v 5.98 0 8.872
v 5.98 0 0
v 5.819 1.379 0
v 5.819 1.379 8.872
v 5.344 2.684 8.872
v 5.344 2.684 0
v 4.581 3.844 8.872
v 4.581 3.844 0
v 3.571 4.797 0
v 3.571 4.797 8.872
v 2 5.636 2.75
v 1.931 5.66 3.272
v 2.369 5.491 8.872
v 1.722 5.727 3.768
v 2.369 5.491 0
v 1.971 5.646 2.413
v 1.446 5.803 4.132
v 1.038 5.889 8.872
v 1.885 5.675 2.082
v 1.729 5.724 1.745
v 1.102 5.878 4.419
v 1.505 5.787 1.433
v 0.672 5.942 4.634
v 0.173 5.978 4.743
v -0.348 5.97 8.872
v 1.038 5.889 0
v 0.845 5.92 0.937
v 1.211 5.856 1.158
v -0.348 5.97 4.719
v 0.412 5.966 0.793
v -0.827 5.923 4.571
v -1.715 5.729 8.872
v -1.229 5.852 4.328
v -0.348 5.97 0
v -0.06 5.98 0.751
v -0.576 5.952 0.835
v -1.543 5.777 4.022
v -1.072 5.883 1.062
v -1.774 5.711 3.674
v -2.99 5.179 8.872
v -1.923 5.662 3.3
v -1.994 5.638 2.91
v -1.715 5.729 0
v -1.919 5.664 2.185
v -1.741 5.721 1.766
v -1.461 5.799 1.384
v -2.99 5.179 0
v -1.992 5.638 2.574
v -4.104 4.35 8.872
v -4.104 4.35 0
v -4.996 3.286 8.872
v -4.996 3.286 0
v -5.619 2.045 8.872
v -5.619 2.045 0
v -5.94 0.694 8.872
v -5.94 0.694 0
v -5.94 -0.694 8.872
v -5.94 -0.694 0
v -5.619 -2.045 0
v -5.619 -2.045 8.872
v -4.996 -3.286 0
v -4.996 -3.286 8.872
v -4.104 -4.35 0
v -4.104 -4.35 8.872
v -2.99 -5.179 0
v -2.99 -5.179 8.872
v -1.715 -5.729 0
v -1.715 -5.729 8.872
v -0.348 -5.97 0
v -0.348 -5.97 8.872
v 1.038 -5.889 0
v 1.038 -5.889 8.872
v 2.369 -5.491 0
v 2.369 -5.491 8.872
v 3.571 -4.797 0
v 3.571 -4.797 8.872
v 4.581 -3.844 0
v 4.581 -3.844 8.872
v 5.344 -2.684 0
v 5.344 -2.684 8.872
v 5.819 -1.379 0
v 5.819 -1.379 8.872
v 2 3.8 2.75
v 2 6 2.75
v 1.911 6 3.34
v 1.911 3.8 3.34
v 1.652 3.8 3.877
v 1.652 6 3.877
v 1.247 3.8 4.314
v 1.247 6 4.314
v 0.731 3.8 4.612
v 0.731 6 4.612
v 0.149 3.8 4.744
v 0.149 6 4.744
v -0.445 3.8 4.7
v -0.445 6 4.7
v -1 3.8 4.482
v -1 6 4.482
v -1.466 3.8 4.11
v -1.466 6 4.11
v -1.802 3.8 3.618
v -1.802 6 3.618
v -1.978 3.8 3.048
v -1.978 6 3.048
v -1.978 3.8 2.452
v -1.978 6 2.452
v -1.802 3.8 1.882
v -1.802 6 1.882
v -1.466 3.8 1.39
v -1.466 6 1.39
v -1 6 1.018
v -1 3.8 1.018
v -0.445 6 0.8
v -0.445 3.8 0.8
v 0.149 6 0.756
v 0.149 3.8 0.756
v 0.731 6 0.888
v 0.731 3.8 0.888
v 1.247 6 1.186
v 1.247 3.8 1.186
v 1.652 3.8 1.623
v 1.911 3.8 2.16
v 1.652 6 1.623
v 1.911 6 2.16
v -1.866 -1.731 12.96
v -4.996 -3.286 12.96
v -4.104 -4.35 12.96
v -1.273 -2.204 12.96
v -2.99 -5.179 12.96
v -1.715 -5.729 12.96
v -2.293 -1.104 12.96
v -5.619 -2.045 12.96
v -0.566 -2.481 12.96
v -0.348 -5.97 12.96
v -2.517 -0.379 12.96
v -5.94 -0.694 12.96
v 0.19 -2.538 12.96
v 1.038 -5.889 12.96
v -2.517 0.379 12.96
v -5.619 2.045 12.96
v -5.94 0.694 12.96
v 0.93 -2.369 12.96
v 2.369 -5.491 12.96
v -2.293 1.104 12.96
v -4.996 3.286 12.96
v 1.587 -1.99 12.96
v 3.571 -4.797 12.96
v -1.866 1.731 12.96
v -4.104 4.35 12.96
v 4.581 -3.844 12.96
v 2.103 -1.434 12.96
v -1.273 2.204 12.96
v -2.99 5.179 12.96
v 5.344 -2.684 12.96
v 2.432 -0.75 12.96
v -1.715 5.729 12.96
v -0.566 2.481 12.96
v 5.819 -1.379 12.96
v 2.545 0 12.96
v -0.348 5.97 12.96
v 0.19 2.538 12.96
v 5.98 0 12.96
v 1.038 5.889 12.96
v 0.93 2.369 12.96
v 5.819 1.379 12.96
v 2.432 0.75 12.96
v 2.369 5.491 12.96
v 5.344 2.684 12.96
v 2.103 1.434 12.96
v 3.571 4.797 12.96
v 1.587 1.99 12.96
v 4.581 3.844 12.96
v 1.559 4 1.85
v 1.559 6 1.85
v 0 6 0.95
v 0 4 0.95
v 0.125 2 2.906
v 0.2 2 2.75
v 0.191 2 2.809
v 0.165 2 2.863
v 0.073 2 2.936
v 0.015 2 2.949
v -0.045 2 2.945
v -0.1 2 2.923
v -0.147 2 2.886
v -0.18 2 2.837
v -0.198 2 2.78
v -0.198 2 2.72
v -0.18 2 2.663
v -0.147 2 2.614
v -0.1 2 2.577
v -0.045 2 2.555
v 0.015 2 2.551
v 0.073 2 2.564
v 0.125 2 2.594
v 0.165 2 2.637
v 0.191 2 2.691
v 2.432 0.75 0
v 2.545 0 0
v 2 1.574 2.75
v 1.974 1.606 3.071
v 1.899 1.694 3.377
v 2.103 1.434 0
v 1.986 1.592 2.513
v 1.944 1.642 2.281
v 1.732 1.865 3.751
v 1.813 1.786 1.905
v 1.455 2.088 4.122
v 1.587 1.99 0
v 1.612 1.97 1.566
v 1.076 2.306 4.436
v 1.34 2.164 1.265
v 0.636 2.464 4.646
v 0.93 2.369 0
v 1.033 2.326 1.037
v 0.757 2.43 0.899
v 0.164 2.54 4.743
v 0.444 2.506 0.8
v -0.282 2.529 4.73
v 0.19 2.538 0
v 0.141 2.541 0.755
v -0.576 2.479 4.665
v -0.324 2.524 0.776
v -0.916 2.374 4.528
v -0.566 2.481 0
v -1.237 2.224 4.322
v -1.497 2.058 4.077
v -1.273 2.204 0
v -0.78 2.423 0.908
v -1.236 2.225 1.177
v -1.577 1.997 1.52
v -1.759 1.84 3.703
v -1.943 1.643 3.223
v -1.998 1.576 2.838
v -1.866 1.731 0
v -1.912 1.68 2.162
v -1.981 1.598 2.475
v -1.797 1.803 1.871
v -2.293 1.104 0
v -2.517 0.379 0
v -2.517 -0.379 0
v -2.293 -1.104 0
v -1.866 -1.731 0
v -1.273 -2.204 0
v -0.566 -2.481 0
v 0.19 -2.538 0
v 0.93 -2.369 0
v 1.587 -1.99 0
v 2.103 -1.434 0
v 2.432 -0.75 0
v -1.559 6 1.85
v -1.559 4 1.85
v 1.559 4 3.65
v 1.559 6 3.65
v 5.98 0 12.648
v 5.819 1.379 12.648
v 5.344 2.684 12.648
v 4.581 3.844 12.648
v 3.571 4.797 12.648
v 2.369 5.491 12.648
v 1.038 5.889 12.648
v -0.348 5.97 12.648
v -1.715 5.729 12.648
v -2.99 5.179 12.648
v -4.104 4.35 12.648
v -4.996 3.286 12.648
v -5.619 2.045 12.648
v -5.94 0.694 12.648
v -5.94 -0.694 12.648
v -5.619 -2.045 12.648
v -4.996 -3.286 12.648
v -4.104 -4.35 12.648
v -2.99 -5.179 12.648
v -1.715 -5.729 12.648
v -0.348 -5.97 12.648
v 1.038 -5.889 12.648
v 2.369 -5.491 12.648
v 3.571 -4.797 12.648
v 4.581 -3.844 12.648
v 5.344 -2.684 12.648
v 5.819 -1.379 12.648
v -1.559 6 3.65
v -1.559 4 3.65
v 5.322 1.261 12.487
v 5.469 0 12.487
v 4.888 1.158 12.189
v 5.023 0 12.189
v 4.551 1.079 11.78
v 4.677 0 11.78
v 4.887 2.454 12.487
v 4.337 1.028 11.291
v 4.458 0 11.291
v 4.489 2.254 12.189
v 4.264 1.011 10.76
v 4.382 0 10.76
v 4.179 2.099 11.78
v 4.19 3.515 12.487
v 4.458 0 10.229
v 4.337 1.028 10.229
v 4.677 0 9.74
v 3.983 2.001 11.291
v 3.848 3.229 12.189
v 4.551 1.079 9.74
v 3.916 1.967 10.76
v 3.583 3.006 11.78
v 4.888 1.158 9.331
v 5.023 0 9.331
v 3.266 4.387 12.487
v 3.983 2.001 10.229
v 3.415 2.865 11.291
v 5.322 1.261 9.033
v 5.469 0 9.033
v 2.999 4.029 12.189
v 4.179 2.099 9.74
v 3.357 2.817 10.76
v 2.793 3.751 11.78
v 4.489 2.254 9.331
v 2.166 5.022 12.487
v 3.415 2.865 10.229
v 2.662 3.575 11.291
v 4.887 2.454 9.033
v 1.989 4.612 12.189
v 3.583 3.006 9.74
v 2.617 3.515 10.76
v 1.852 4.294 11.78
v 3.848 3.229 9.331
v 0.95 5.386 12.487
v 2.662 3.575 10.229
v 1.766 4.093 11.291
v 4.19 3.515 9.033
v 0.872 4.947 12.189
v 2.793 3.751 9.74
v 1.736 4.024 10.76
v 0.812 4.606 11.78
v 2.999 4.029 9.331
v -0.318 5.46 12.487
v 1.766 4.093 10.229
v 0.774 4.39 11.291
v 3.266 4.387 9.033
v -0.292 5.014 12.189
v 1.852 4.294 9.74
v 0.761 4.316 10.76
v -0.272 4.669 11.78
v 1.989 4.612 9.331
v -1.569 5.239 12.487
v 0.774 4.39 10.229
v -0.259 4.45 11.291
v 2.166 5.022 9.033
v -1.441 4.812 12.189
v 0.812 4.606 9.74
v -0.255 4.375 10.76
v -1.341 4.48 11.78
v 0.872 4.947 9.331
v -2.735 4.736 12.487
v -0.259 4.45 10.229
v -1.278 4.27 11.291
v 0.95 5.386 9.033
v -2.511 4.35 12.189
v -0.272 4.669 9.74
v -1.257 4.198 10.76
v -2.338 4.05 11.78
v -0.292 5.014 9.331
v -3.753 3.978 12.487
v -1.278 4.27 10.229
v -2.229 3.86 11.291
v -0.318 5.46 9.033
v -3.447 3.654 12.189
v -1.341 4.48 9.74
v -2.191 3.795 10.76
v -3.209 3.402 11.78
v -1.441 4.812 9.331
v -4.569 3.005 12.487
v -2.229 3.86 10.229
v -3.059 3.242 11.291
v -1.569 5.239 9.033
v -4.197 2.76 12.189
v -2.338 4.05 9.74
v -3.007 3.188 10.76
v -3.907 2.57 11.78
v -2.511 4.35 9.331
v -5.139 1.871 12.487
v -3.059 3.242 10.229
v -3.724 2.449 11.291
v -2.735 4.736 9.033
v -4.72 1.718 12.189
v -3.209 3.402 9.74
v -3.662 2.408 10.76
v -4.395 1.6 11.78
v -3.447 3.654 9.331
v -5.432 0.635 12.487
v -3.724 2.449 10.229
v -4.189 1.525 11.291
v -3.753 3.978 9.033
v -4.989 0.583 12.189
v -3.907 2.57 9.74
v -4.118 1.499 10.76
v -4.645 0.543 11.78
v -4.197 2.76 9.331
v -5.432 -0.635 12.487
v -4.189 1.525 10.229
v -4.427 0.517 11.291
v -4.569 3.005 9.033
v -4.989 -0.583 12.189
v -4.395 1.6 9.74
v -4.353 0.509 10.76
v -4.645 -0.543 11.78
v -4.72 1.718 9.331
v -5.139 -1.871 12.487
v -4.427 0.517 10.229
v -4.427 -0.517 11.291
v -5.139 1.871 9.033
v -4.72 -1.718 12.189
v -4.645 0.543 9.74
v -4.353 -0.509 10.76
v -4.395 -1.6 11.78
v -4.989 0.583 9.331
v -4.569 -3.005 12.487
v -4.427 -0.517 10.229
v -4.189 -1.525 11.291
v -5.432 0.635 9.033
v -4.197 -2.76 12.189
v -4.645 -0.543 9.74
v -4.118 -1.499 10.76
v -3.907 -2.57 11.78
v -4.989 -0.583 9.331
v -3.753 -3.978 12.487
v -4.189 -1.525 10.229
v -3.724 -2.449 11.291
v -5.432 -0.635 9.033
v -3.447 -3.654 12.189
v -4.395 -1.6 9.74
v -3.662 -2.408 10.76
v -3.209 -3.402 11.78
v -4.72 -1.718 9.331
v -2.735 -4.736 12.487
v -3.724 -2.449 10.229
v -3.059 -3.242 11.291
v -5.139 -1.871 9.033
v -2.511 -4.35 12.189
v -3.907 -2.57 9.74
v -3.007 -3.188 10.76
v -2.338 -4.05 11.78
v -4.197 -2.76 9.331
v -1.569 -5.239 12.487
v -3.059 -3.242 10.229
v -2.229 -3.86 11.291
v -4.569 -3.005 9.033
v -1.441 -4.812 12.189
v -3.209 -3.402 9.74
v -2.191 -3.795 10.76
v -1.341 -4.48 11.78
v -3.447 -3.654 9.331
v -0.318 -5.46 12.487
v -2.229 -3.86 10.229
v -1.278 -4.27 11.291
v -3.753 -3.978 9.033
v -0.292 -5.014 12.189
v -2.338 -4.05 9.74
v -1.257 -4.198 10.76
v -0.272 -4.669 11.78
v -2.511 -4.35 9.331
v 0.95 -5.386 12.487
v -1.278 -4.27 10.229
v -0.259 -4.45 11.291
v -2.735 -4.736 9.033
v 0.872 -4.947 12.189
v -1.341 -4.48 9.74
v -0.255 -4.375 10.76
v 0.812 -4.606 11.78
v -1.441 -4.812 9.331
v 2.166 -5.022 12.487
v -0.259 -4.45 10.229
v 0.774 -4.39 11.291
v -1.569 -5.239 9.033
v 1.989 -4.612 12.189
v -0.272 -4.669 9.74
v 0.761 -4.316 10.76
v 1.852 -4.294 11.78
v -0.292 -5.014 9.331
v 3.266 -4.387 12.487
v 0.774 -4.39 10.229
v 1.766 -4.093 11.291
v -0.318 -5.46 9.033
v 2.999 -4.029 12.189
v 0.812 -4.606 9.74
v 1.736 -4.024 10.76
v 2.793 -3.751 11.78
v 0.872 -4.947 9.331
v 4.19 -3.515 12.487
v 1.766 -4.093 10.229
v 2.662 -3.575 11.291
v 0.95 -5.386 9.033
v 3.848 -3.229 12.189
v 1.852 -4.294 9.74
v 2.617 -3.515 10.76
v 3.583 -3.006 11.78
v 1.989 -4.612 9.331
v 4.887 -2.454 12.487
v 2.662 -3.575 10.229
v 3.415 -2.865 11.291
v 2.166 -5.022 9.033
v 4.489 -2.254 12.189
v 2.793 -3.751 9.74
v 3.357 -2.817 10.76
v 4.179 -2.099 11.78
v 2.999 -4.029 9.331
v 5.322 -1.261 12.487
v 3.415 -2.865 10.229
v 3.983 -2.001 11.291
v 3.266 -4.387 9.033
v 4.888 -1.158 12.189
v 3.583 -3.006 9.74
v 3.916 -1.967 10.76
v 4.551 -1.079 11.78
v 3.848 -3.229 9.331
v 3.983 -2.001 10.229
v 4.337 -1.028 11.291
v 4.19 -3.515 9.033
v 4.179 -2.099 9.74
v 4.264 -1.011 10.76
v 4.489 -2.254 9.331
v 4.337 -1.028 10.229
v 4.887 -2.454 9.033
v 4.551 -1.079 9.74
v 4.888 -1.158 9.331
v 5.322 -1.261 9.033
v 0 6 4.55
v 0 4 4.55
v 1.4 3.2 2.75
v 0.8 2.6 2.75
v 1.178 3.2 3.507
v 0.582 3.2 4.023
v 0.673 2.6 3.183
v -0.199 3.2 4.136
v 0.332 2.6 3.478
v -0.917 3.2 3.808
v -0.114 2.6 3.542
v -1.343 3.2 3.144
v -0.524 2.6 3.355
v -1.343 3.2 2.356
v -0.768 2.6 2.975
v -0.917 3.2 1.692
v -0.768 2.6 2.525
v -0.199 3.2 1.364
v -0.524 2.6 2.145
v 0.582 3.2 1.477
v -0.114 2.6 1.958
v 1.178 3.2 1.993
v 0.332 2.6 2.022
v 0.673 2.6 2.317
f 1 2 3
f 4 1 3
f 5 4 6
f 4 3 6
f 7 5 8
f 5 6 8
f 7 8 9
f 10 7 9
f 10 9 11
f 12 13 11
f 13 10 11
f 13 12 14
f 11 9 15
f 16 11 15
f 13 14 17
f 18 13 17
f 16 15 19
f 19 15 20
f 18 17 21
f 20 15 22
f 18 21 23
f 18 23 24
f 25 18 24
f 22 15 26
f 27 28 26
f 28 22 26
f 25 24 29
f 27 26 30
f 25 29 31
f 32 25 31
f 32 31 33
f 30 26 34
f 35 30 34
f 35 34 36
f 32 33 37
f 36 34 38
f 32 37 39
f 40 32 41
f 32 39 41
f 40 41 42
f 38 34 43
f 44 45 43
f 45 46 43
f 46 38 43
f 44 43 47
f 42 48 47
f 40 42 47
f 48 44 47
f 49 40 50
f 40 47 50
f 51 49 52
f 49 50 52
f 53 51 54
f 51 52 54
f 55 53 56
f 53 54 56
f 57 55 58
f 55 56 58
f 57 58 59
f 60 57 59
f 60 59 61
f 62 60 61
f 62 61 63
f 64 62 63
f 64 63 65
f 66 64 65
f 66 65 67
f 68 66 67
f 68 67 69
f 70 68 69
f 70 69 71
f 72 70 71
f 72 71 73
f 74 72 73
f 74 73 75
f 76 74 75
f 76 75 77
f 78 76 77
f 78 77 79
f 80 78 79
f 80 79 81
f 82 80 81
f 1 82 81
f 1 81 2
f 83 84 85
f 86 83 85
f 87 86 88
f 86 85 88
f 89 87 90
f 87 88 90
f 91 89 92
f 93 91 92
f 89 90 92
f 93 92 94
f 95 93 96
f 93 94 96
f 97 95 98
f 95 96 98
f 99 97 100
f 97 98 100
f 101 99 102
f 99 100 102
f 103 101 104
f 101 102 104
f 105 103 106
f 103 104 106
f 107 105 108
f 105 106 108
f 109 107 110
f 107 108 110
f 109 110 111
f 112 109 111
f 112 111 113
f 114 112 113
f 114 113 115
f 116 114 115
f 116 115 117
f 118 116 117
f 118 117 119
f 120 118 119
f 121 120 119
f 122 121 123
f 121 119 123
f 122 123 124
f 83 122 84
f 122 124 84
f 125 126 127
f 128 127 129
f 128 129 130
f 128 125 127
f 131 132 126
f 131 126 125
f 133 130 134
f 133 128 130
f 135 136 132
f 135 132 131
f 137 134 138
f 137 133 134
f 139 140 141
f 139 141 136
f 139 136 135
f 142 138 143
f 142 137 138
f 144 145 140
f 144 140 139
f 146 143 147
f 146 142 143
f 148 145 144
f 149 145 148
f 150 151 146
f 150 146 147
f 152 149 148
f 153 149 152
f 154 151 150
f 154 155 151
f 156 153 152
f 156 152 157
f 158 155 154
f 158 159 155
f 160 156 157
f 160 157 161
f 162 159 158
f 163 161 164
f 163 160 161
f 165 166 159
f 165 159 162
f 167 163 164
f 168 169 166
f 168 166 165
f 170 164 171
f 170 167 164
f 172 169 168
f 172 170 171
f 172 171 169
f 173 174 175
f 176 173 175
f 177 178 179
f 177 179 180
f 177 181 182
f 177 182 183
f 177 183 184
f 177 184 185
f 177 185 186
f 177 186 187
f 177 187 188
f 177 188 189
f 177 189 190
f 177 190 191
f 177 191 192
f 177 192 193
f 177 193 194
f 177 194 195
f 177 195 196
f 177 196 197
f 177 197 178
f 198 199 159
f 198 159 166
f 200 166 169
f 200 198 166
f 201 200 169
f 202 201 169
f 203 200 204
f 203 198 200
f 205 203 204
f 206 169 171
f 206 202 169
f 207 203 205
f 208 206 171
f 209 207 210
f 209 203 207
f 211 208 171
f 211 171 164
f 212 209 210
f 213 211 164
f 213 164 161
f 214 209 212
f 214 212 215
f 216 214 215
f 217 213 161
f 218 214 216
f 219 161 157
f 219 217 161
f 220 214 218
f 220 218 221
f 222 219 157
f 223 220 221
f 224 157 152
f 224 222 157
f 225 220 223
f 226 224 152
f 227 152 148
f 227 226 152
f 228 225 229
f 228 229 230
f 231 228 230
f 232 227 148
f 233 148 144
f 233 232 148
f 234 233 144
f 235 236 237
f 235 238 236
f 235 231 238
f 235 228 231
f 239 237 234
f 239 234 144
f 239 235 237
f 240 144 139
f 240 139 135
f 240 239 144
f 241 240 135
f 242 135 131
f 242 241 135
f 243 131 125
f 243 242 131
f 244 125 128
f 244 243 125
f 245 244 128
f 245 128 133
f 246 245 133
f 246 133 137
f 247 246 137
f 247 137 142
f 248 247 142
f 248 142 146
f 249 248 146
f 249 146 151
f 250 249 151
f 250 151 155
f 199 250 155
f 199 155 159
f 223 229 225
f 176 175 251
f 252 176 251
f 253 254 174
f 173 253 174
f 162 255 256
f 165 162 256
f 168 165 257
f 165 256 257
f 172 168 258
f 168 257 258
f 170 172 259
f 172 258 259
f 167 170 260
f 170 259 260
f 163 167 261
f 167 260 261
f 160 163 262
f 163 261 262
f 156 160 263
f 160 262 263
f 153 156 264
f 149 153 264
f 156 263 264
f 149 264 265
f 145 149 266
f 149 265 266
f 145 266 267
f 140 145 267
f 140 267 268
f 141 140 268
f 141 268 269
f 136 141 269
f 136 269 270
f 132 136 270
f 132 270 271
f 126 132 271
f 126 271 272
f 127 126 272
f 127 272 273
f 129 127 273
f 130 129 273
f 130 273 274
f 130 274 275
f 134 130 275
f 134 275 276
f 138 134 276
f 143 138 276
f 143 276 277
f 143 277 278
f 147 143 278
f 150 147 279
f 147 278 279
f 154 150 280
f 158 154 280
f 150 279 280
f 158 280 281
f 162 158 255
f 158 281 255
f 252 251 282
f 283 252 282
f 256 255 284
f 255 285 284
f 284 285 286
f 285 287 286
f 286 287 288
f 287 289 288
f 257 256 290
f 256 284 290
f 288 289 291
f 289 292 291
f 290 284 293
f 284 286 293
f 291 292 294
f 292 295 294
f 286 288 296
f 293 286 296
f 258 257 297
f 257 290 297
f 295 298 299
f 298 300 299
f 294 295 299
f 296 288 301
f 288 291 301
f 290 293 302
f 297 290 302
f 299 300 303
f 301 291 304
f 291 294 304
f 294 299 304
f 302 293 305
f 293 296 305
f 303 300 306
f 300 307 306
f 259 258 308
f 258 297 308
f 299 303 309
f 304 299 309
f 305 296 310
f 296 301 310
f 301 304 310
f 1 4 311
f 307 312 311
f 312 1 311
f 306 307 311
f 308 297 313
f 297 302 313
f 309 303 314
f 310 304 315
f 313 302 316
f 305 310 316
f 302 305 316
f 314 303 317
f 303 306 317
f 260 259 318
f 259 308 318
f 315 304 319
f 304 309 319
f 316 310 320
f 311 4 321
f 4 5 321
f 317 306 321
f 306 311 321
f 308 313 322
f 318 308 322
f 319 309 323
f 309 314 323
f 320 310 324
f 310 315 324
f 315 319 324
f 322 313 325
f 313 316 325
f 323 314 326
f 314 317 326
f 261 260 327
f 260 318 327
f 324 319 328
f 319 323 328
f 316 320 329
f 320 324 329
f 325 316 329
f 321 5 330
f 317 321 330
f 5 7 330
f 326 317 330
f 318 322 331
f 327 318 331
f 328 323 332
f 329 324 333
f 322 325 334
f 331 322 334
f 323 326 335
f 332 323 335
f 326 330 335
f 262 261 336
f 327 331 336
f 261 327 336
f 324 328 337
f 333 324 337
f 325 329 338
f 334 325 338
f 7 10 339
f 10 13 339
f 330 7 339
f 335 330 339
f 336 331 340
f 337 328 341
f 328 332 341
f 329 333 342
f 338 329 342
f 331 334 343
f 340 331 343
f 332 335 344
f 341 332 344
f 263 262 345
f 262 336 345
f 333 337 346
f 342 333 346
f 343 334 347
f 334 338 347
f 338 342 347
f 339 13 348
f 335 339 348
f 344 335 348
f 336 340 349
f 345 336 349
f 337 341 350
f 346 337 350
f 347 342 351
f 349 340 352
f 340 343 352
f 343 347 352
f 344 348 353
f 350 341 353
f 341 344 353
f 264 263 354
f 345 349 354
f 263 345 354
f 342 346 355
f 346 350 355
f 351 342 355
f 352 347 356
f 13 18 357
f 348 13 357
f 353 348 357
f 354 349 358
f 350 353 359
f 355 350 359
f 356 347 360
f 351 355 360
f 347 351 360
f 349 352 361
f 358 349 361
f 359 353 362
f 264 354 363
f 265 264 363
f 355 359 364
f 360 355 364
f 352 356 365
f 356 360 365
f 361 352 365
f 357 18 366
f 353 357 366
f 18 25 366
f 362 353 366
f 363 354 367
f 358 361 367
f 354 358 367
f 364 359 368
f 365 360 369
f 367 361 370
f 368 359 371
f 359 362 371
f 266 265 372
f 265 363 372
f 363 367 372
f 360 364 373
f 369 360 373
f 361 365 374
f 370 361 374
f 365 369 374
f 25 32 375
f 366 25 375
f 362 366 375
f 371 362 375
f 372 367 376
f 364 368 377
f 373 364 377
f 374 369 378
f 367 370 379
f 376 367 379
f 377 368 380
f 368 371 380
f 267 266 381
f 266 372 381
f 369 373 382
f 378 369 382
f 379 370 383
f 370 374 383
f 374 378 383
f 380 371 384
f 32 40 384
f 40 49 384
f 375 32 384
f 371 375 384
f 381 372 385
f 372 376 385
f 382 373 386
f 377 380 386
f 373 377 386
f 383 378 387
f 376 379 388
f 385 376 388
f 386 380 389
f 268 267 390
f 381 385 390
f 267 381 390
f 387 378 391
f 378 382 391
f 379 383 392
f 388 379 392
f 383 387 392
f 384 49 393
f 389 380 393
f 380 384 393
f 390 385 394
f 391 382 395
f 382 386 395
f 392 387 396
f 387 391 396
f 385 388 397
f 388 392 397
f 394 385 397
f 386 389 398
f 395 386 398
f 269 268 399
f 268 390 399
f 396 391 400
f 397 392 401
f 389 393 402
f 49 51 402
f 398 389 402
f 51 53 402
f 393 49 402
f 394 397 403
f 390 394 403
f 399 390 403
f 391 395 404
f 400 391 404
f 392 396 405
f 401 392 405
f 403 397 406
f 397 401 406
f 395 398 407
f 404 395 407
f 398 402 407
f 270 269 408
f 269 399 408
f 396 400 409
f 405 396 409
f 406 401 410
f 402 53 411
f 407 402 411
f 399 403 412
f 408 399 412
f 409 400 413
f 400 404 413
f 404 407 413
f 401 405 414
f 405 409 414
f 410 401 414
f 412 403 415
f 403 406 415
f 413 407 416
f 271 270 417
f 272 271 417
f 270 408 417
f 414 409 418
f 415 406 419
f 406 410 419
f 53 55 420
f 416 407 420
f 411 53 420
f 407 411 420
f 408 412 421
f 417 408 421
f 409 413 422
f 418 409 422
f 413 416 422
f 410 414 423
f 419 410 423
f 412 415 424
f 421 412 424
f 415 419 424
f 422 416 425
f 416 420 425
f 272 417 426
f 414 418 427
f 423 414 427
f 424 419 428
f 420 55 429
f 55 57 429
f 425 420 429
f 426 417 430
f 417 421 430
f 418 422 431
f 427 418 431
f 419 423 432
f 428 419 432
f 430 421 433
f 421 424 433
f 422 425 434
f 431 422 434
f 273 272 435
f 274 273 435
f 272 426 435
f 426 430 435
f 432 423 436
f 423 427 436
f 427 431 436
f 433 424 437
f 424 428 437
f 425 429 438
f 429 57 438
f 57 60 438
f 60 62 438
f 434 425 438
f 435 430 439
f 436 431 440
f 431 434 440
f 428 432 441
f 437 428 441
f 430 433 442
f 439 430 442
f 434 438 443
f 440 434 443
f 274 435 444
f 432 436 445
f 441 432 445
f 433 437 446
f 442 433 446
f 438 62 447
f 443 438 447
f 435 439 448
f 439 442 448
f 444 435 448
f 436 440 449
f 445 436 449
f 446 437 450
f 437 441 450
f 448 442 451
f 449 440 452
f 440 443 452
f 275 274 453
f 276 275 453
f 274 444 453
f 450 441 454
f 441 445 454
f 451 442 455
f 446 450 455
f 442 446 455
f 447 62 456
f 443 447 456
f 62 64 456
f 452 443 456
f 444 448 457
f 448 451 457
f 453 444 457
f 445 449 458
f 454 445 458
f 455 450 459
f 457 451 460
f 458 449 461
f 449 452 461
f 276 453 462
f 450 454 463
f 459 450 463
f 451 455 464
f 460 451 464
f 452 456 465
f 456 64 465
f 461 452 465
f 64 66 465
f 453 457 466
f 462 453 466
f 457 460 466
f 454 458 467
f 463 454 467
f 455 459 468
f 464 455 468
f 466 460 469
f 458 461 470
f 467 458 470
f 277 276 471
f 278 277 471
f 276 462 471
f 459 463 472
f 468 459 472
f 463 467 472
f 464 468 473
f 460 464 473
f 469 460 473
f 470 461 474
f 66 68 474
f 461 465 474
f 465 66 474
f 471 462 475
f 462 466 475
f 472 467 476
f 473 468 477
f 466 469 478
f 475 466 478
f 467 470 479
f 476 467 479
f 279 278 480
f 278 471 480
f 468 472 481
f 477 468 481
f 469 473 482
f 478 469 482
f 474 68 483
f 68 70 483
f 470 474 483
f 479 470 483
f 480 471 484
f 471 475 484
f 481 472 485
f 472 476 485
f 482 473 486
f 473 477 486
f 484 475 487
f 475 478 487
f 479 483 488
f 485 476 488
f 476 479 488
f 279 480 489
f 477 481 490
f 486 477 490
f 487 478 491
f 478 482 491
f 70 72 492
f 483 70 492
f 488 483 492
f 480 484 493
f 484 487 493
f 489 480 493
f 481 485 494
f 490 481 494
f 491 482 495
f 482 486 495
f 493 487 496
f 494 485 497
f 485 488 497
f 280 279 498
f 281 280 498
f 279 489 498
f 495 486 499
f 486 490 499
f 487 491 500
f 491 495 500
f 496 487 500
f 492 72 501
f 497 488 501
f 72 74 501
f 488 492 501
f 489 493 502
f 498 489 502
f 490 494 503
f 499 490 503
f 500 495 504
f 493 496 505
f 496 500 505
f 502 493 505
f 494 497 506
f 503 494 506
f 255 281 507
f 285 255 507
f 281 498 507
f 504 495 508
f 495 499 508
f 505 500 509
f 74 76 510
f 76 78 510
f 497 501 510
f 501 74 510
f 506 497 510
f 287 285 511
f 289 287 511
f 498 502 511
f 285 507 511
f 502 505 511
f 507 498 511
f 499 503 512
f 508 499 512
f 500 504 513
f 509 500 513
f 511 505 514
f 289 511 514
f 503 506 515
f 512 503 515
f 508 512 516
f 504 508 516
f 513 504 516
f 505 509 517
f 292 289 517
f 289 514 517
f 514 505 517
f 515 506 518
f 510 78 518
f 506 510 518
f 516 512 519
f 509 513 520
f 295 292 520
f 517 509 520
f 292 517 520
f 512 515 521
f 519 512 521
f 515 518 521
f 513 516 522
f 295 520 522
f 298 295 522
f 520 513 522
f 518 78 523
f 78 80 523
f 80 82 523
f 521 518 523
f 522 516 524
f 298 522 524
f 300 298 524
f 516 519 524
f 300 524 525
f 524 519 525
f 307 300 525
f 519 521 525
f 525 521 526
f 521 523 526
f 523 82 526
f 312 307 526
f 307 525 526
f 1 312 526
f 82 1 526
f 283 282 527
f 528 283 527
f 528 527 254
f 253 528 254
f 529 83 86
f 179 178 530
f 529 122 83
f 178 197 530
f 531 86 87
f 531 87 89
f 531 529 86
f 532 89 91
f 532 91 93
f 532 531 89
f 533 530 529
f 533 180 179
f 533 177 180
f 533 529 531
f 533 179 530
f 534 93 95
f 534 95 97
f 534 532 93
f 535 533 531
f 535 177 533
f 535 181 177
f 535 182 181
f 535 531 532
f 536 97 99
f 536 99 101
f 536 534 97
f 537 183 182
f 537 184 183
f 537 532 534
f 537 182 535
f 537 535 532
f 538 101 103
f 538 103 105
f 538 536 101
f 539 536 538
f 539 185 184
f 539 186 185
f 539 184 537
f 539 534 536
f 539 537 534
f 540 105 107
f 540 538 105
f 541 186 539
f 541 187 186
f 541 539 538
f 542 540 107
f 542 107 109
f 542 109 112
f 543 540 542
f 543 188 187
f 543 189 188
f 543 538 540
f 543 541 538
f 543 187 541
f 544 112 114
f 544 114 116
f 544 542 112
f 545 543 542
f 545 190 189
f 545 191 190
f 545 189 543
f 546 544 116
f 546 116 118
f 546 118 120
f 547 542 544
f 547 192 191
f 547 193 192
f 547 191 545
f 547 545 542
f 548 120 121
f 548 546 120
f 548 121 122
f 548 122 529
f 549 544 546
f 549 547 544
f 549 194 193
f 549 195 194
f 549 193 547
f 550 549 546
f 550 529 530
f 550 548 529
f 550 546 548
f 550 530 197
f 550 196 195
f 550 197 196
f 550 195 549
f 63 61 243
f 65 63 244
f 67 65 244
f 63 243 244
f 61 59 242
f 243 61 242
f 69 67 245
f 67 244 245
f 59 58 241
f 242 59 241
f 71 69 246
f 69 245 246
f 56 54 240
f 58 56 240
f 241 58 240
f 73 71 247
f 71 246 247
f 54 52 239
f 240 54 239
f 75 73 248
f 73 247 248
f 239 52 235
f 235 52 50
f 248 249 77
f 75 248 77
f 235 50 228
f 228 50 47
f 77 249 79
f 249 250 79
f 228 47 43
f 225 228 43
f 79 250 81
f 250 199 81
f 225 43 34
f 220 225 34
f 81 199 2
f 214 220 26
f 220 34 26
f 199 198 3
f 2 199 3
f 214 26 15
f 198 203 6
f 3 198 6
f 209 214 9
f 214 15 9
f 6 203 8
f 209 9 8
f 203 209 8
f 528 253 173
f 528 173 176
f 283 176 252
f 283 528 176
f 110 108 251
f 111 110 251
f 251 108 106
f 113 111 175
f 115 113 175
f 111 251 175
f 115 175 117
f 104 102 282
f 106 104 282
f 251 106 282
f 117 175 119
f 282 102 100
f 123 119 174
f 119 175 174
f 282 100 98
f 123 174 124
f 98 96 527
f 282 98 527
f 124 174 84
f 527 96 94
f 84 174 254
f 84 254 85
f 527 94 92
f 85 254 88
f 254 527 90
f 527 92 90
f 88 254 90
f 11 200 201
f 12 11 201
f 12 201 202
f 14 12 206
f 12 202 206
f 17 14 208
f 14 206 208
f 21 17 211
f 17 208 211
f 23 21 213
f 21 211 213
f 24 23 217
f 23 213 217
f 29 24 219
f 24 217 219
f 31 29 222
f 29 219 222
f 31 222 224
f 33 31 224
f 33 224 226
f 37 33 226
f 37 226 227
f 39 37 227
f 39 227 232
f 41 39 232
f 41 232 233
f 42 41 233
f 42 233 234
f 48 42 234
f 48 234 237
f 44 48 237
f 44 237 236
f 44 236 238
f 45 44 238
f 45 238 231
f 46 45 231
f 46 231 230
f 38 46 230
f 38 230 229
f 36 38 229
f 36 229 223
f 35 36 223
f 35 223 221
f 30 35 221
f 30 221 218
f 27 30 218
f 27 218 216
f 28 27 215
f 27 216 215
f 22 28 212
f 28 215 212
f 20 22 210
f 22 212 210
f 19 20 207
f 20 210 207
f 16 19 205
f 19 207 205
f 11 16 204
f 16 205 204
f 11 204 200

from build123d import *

# Parameters (mm, degrees)
F0_R      = 5.98
F0_R_2    = 2.545
F1_DEPTH  = 12.96
F2_R      = 2
F3_DEPTH  = 5.981
F6_R      = 1.915
F10_R     = 2
F11_DEPTH = 4
F12_SIZE  = 1.8
F14_DEPTH = 2


with BuildPart() as f1:
    # F0 (on Top) → F1 (new body)
    with BuildSketch(Plane.XY):
        Circle(F0_R)
        Circle(F0_R_2, mode=Mode.SUBTRACT)
    extrude(amount=F1_DEPTH)

    # F2 (on Front) → F3 (cut, through all)
    with BuildSketch(Plane.XZ):
        with Locations((0, 2.75)):
            Circle(F2_R)
    extrude(amount=-F3_DEPTH, mode=Mode.SUBTRACT)


with BuildPart() as f7:
    # F7: sweep along a path in F5
    with BuildLine(Plane.XY.offset(10.76)) as f7_path:
        CenterArc((0, 0), 6.2975, 0, 360)
    # F6 (on Front) → F7 (sweep)
    with BuildSketch(Plane.XZ):
        with Locations((6.2975, 10.76)):
            Circle(F6_R)
    sweep(path=f7_path.line)


with BuildPart() as f1_1:
    add(f1.part)

    # F8: cut F7
    add(f7.part, mode=Mode.SUBTRACT)


with BuildPart() as f11:
    # F10 (on offset) → F11 (new body)
    with BuildSketch(Plane.XZ.offset(-6)):
        with Locations((0, 2.75)):
            Circle(F10_R)
    extrude(amount=F11_DEPTH)

    # F12
    f12_edges = [f11.edges().sort_by_distance(p)[0] for p in [
        (-2, 2, 2.75),
    ]]
    chamfer(f12_edges, length=F12_SIZE)

    # F13 (on face) → F14 (cut)
    with BuildSketch(Plane(origin=(0, 6, 0), x_dir=(-1, 0, 0), z_dir=(0, 1, 0))):
        Polygon((0, 0.95), (1.558846, 1.85), (1.558846, 3.65), (0, 4.55), (-1.558846, 3.65), (-1.558846, 1.85), align=None)
    extrude(amount=-F14_DEPTH, mode=Mode.SUBTRACT)


solid = Compound([f1_1.part, f11.part])
